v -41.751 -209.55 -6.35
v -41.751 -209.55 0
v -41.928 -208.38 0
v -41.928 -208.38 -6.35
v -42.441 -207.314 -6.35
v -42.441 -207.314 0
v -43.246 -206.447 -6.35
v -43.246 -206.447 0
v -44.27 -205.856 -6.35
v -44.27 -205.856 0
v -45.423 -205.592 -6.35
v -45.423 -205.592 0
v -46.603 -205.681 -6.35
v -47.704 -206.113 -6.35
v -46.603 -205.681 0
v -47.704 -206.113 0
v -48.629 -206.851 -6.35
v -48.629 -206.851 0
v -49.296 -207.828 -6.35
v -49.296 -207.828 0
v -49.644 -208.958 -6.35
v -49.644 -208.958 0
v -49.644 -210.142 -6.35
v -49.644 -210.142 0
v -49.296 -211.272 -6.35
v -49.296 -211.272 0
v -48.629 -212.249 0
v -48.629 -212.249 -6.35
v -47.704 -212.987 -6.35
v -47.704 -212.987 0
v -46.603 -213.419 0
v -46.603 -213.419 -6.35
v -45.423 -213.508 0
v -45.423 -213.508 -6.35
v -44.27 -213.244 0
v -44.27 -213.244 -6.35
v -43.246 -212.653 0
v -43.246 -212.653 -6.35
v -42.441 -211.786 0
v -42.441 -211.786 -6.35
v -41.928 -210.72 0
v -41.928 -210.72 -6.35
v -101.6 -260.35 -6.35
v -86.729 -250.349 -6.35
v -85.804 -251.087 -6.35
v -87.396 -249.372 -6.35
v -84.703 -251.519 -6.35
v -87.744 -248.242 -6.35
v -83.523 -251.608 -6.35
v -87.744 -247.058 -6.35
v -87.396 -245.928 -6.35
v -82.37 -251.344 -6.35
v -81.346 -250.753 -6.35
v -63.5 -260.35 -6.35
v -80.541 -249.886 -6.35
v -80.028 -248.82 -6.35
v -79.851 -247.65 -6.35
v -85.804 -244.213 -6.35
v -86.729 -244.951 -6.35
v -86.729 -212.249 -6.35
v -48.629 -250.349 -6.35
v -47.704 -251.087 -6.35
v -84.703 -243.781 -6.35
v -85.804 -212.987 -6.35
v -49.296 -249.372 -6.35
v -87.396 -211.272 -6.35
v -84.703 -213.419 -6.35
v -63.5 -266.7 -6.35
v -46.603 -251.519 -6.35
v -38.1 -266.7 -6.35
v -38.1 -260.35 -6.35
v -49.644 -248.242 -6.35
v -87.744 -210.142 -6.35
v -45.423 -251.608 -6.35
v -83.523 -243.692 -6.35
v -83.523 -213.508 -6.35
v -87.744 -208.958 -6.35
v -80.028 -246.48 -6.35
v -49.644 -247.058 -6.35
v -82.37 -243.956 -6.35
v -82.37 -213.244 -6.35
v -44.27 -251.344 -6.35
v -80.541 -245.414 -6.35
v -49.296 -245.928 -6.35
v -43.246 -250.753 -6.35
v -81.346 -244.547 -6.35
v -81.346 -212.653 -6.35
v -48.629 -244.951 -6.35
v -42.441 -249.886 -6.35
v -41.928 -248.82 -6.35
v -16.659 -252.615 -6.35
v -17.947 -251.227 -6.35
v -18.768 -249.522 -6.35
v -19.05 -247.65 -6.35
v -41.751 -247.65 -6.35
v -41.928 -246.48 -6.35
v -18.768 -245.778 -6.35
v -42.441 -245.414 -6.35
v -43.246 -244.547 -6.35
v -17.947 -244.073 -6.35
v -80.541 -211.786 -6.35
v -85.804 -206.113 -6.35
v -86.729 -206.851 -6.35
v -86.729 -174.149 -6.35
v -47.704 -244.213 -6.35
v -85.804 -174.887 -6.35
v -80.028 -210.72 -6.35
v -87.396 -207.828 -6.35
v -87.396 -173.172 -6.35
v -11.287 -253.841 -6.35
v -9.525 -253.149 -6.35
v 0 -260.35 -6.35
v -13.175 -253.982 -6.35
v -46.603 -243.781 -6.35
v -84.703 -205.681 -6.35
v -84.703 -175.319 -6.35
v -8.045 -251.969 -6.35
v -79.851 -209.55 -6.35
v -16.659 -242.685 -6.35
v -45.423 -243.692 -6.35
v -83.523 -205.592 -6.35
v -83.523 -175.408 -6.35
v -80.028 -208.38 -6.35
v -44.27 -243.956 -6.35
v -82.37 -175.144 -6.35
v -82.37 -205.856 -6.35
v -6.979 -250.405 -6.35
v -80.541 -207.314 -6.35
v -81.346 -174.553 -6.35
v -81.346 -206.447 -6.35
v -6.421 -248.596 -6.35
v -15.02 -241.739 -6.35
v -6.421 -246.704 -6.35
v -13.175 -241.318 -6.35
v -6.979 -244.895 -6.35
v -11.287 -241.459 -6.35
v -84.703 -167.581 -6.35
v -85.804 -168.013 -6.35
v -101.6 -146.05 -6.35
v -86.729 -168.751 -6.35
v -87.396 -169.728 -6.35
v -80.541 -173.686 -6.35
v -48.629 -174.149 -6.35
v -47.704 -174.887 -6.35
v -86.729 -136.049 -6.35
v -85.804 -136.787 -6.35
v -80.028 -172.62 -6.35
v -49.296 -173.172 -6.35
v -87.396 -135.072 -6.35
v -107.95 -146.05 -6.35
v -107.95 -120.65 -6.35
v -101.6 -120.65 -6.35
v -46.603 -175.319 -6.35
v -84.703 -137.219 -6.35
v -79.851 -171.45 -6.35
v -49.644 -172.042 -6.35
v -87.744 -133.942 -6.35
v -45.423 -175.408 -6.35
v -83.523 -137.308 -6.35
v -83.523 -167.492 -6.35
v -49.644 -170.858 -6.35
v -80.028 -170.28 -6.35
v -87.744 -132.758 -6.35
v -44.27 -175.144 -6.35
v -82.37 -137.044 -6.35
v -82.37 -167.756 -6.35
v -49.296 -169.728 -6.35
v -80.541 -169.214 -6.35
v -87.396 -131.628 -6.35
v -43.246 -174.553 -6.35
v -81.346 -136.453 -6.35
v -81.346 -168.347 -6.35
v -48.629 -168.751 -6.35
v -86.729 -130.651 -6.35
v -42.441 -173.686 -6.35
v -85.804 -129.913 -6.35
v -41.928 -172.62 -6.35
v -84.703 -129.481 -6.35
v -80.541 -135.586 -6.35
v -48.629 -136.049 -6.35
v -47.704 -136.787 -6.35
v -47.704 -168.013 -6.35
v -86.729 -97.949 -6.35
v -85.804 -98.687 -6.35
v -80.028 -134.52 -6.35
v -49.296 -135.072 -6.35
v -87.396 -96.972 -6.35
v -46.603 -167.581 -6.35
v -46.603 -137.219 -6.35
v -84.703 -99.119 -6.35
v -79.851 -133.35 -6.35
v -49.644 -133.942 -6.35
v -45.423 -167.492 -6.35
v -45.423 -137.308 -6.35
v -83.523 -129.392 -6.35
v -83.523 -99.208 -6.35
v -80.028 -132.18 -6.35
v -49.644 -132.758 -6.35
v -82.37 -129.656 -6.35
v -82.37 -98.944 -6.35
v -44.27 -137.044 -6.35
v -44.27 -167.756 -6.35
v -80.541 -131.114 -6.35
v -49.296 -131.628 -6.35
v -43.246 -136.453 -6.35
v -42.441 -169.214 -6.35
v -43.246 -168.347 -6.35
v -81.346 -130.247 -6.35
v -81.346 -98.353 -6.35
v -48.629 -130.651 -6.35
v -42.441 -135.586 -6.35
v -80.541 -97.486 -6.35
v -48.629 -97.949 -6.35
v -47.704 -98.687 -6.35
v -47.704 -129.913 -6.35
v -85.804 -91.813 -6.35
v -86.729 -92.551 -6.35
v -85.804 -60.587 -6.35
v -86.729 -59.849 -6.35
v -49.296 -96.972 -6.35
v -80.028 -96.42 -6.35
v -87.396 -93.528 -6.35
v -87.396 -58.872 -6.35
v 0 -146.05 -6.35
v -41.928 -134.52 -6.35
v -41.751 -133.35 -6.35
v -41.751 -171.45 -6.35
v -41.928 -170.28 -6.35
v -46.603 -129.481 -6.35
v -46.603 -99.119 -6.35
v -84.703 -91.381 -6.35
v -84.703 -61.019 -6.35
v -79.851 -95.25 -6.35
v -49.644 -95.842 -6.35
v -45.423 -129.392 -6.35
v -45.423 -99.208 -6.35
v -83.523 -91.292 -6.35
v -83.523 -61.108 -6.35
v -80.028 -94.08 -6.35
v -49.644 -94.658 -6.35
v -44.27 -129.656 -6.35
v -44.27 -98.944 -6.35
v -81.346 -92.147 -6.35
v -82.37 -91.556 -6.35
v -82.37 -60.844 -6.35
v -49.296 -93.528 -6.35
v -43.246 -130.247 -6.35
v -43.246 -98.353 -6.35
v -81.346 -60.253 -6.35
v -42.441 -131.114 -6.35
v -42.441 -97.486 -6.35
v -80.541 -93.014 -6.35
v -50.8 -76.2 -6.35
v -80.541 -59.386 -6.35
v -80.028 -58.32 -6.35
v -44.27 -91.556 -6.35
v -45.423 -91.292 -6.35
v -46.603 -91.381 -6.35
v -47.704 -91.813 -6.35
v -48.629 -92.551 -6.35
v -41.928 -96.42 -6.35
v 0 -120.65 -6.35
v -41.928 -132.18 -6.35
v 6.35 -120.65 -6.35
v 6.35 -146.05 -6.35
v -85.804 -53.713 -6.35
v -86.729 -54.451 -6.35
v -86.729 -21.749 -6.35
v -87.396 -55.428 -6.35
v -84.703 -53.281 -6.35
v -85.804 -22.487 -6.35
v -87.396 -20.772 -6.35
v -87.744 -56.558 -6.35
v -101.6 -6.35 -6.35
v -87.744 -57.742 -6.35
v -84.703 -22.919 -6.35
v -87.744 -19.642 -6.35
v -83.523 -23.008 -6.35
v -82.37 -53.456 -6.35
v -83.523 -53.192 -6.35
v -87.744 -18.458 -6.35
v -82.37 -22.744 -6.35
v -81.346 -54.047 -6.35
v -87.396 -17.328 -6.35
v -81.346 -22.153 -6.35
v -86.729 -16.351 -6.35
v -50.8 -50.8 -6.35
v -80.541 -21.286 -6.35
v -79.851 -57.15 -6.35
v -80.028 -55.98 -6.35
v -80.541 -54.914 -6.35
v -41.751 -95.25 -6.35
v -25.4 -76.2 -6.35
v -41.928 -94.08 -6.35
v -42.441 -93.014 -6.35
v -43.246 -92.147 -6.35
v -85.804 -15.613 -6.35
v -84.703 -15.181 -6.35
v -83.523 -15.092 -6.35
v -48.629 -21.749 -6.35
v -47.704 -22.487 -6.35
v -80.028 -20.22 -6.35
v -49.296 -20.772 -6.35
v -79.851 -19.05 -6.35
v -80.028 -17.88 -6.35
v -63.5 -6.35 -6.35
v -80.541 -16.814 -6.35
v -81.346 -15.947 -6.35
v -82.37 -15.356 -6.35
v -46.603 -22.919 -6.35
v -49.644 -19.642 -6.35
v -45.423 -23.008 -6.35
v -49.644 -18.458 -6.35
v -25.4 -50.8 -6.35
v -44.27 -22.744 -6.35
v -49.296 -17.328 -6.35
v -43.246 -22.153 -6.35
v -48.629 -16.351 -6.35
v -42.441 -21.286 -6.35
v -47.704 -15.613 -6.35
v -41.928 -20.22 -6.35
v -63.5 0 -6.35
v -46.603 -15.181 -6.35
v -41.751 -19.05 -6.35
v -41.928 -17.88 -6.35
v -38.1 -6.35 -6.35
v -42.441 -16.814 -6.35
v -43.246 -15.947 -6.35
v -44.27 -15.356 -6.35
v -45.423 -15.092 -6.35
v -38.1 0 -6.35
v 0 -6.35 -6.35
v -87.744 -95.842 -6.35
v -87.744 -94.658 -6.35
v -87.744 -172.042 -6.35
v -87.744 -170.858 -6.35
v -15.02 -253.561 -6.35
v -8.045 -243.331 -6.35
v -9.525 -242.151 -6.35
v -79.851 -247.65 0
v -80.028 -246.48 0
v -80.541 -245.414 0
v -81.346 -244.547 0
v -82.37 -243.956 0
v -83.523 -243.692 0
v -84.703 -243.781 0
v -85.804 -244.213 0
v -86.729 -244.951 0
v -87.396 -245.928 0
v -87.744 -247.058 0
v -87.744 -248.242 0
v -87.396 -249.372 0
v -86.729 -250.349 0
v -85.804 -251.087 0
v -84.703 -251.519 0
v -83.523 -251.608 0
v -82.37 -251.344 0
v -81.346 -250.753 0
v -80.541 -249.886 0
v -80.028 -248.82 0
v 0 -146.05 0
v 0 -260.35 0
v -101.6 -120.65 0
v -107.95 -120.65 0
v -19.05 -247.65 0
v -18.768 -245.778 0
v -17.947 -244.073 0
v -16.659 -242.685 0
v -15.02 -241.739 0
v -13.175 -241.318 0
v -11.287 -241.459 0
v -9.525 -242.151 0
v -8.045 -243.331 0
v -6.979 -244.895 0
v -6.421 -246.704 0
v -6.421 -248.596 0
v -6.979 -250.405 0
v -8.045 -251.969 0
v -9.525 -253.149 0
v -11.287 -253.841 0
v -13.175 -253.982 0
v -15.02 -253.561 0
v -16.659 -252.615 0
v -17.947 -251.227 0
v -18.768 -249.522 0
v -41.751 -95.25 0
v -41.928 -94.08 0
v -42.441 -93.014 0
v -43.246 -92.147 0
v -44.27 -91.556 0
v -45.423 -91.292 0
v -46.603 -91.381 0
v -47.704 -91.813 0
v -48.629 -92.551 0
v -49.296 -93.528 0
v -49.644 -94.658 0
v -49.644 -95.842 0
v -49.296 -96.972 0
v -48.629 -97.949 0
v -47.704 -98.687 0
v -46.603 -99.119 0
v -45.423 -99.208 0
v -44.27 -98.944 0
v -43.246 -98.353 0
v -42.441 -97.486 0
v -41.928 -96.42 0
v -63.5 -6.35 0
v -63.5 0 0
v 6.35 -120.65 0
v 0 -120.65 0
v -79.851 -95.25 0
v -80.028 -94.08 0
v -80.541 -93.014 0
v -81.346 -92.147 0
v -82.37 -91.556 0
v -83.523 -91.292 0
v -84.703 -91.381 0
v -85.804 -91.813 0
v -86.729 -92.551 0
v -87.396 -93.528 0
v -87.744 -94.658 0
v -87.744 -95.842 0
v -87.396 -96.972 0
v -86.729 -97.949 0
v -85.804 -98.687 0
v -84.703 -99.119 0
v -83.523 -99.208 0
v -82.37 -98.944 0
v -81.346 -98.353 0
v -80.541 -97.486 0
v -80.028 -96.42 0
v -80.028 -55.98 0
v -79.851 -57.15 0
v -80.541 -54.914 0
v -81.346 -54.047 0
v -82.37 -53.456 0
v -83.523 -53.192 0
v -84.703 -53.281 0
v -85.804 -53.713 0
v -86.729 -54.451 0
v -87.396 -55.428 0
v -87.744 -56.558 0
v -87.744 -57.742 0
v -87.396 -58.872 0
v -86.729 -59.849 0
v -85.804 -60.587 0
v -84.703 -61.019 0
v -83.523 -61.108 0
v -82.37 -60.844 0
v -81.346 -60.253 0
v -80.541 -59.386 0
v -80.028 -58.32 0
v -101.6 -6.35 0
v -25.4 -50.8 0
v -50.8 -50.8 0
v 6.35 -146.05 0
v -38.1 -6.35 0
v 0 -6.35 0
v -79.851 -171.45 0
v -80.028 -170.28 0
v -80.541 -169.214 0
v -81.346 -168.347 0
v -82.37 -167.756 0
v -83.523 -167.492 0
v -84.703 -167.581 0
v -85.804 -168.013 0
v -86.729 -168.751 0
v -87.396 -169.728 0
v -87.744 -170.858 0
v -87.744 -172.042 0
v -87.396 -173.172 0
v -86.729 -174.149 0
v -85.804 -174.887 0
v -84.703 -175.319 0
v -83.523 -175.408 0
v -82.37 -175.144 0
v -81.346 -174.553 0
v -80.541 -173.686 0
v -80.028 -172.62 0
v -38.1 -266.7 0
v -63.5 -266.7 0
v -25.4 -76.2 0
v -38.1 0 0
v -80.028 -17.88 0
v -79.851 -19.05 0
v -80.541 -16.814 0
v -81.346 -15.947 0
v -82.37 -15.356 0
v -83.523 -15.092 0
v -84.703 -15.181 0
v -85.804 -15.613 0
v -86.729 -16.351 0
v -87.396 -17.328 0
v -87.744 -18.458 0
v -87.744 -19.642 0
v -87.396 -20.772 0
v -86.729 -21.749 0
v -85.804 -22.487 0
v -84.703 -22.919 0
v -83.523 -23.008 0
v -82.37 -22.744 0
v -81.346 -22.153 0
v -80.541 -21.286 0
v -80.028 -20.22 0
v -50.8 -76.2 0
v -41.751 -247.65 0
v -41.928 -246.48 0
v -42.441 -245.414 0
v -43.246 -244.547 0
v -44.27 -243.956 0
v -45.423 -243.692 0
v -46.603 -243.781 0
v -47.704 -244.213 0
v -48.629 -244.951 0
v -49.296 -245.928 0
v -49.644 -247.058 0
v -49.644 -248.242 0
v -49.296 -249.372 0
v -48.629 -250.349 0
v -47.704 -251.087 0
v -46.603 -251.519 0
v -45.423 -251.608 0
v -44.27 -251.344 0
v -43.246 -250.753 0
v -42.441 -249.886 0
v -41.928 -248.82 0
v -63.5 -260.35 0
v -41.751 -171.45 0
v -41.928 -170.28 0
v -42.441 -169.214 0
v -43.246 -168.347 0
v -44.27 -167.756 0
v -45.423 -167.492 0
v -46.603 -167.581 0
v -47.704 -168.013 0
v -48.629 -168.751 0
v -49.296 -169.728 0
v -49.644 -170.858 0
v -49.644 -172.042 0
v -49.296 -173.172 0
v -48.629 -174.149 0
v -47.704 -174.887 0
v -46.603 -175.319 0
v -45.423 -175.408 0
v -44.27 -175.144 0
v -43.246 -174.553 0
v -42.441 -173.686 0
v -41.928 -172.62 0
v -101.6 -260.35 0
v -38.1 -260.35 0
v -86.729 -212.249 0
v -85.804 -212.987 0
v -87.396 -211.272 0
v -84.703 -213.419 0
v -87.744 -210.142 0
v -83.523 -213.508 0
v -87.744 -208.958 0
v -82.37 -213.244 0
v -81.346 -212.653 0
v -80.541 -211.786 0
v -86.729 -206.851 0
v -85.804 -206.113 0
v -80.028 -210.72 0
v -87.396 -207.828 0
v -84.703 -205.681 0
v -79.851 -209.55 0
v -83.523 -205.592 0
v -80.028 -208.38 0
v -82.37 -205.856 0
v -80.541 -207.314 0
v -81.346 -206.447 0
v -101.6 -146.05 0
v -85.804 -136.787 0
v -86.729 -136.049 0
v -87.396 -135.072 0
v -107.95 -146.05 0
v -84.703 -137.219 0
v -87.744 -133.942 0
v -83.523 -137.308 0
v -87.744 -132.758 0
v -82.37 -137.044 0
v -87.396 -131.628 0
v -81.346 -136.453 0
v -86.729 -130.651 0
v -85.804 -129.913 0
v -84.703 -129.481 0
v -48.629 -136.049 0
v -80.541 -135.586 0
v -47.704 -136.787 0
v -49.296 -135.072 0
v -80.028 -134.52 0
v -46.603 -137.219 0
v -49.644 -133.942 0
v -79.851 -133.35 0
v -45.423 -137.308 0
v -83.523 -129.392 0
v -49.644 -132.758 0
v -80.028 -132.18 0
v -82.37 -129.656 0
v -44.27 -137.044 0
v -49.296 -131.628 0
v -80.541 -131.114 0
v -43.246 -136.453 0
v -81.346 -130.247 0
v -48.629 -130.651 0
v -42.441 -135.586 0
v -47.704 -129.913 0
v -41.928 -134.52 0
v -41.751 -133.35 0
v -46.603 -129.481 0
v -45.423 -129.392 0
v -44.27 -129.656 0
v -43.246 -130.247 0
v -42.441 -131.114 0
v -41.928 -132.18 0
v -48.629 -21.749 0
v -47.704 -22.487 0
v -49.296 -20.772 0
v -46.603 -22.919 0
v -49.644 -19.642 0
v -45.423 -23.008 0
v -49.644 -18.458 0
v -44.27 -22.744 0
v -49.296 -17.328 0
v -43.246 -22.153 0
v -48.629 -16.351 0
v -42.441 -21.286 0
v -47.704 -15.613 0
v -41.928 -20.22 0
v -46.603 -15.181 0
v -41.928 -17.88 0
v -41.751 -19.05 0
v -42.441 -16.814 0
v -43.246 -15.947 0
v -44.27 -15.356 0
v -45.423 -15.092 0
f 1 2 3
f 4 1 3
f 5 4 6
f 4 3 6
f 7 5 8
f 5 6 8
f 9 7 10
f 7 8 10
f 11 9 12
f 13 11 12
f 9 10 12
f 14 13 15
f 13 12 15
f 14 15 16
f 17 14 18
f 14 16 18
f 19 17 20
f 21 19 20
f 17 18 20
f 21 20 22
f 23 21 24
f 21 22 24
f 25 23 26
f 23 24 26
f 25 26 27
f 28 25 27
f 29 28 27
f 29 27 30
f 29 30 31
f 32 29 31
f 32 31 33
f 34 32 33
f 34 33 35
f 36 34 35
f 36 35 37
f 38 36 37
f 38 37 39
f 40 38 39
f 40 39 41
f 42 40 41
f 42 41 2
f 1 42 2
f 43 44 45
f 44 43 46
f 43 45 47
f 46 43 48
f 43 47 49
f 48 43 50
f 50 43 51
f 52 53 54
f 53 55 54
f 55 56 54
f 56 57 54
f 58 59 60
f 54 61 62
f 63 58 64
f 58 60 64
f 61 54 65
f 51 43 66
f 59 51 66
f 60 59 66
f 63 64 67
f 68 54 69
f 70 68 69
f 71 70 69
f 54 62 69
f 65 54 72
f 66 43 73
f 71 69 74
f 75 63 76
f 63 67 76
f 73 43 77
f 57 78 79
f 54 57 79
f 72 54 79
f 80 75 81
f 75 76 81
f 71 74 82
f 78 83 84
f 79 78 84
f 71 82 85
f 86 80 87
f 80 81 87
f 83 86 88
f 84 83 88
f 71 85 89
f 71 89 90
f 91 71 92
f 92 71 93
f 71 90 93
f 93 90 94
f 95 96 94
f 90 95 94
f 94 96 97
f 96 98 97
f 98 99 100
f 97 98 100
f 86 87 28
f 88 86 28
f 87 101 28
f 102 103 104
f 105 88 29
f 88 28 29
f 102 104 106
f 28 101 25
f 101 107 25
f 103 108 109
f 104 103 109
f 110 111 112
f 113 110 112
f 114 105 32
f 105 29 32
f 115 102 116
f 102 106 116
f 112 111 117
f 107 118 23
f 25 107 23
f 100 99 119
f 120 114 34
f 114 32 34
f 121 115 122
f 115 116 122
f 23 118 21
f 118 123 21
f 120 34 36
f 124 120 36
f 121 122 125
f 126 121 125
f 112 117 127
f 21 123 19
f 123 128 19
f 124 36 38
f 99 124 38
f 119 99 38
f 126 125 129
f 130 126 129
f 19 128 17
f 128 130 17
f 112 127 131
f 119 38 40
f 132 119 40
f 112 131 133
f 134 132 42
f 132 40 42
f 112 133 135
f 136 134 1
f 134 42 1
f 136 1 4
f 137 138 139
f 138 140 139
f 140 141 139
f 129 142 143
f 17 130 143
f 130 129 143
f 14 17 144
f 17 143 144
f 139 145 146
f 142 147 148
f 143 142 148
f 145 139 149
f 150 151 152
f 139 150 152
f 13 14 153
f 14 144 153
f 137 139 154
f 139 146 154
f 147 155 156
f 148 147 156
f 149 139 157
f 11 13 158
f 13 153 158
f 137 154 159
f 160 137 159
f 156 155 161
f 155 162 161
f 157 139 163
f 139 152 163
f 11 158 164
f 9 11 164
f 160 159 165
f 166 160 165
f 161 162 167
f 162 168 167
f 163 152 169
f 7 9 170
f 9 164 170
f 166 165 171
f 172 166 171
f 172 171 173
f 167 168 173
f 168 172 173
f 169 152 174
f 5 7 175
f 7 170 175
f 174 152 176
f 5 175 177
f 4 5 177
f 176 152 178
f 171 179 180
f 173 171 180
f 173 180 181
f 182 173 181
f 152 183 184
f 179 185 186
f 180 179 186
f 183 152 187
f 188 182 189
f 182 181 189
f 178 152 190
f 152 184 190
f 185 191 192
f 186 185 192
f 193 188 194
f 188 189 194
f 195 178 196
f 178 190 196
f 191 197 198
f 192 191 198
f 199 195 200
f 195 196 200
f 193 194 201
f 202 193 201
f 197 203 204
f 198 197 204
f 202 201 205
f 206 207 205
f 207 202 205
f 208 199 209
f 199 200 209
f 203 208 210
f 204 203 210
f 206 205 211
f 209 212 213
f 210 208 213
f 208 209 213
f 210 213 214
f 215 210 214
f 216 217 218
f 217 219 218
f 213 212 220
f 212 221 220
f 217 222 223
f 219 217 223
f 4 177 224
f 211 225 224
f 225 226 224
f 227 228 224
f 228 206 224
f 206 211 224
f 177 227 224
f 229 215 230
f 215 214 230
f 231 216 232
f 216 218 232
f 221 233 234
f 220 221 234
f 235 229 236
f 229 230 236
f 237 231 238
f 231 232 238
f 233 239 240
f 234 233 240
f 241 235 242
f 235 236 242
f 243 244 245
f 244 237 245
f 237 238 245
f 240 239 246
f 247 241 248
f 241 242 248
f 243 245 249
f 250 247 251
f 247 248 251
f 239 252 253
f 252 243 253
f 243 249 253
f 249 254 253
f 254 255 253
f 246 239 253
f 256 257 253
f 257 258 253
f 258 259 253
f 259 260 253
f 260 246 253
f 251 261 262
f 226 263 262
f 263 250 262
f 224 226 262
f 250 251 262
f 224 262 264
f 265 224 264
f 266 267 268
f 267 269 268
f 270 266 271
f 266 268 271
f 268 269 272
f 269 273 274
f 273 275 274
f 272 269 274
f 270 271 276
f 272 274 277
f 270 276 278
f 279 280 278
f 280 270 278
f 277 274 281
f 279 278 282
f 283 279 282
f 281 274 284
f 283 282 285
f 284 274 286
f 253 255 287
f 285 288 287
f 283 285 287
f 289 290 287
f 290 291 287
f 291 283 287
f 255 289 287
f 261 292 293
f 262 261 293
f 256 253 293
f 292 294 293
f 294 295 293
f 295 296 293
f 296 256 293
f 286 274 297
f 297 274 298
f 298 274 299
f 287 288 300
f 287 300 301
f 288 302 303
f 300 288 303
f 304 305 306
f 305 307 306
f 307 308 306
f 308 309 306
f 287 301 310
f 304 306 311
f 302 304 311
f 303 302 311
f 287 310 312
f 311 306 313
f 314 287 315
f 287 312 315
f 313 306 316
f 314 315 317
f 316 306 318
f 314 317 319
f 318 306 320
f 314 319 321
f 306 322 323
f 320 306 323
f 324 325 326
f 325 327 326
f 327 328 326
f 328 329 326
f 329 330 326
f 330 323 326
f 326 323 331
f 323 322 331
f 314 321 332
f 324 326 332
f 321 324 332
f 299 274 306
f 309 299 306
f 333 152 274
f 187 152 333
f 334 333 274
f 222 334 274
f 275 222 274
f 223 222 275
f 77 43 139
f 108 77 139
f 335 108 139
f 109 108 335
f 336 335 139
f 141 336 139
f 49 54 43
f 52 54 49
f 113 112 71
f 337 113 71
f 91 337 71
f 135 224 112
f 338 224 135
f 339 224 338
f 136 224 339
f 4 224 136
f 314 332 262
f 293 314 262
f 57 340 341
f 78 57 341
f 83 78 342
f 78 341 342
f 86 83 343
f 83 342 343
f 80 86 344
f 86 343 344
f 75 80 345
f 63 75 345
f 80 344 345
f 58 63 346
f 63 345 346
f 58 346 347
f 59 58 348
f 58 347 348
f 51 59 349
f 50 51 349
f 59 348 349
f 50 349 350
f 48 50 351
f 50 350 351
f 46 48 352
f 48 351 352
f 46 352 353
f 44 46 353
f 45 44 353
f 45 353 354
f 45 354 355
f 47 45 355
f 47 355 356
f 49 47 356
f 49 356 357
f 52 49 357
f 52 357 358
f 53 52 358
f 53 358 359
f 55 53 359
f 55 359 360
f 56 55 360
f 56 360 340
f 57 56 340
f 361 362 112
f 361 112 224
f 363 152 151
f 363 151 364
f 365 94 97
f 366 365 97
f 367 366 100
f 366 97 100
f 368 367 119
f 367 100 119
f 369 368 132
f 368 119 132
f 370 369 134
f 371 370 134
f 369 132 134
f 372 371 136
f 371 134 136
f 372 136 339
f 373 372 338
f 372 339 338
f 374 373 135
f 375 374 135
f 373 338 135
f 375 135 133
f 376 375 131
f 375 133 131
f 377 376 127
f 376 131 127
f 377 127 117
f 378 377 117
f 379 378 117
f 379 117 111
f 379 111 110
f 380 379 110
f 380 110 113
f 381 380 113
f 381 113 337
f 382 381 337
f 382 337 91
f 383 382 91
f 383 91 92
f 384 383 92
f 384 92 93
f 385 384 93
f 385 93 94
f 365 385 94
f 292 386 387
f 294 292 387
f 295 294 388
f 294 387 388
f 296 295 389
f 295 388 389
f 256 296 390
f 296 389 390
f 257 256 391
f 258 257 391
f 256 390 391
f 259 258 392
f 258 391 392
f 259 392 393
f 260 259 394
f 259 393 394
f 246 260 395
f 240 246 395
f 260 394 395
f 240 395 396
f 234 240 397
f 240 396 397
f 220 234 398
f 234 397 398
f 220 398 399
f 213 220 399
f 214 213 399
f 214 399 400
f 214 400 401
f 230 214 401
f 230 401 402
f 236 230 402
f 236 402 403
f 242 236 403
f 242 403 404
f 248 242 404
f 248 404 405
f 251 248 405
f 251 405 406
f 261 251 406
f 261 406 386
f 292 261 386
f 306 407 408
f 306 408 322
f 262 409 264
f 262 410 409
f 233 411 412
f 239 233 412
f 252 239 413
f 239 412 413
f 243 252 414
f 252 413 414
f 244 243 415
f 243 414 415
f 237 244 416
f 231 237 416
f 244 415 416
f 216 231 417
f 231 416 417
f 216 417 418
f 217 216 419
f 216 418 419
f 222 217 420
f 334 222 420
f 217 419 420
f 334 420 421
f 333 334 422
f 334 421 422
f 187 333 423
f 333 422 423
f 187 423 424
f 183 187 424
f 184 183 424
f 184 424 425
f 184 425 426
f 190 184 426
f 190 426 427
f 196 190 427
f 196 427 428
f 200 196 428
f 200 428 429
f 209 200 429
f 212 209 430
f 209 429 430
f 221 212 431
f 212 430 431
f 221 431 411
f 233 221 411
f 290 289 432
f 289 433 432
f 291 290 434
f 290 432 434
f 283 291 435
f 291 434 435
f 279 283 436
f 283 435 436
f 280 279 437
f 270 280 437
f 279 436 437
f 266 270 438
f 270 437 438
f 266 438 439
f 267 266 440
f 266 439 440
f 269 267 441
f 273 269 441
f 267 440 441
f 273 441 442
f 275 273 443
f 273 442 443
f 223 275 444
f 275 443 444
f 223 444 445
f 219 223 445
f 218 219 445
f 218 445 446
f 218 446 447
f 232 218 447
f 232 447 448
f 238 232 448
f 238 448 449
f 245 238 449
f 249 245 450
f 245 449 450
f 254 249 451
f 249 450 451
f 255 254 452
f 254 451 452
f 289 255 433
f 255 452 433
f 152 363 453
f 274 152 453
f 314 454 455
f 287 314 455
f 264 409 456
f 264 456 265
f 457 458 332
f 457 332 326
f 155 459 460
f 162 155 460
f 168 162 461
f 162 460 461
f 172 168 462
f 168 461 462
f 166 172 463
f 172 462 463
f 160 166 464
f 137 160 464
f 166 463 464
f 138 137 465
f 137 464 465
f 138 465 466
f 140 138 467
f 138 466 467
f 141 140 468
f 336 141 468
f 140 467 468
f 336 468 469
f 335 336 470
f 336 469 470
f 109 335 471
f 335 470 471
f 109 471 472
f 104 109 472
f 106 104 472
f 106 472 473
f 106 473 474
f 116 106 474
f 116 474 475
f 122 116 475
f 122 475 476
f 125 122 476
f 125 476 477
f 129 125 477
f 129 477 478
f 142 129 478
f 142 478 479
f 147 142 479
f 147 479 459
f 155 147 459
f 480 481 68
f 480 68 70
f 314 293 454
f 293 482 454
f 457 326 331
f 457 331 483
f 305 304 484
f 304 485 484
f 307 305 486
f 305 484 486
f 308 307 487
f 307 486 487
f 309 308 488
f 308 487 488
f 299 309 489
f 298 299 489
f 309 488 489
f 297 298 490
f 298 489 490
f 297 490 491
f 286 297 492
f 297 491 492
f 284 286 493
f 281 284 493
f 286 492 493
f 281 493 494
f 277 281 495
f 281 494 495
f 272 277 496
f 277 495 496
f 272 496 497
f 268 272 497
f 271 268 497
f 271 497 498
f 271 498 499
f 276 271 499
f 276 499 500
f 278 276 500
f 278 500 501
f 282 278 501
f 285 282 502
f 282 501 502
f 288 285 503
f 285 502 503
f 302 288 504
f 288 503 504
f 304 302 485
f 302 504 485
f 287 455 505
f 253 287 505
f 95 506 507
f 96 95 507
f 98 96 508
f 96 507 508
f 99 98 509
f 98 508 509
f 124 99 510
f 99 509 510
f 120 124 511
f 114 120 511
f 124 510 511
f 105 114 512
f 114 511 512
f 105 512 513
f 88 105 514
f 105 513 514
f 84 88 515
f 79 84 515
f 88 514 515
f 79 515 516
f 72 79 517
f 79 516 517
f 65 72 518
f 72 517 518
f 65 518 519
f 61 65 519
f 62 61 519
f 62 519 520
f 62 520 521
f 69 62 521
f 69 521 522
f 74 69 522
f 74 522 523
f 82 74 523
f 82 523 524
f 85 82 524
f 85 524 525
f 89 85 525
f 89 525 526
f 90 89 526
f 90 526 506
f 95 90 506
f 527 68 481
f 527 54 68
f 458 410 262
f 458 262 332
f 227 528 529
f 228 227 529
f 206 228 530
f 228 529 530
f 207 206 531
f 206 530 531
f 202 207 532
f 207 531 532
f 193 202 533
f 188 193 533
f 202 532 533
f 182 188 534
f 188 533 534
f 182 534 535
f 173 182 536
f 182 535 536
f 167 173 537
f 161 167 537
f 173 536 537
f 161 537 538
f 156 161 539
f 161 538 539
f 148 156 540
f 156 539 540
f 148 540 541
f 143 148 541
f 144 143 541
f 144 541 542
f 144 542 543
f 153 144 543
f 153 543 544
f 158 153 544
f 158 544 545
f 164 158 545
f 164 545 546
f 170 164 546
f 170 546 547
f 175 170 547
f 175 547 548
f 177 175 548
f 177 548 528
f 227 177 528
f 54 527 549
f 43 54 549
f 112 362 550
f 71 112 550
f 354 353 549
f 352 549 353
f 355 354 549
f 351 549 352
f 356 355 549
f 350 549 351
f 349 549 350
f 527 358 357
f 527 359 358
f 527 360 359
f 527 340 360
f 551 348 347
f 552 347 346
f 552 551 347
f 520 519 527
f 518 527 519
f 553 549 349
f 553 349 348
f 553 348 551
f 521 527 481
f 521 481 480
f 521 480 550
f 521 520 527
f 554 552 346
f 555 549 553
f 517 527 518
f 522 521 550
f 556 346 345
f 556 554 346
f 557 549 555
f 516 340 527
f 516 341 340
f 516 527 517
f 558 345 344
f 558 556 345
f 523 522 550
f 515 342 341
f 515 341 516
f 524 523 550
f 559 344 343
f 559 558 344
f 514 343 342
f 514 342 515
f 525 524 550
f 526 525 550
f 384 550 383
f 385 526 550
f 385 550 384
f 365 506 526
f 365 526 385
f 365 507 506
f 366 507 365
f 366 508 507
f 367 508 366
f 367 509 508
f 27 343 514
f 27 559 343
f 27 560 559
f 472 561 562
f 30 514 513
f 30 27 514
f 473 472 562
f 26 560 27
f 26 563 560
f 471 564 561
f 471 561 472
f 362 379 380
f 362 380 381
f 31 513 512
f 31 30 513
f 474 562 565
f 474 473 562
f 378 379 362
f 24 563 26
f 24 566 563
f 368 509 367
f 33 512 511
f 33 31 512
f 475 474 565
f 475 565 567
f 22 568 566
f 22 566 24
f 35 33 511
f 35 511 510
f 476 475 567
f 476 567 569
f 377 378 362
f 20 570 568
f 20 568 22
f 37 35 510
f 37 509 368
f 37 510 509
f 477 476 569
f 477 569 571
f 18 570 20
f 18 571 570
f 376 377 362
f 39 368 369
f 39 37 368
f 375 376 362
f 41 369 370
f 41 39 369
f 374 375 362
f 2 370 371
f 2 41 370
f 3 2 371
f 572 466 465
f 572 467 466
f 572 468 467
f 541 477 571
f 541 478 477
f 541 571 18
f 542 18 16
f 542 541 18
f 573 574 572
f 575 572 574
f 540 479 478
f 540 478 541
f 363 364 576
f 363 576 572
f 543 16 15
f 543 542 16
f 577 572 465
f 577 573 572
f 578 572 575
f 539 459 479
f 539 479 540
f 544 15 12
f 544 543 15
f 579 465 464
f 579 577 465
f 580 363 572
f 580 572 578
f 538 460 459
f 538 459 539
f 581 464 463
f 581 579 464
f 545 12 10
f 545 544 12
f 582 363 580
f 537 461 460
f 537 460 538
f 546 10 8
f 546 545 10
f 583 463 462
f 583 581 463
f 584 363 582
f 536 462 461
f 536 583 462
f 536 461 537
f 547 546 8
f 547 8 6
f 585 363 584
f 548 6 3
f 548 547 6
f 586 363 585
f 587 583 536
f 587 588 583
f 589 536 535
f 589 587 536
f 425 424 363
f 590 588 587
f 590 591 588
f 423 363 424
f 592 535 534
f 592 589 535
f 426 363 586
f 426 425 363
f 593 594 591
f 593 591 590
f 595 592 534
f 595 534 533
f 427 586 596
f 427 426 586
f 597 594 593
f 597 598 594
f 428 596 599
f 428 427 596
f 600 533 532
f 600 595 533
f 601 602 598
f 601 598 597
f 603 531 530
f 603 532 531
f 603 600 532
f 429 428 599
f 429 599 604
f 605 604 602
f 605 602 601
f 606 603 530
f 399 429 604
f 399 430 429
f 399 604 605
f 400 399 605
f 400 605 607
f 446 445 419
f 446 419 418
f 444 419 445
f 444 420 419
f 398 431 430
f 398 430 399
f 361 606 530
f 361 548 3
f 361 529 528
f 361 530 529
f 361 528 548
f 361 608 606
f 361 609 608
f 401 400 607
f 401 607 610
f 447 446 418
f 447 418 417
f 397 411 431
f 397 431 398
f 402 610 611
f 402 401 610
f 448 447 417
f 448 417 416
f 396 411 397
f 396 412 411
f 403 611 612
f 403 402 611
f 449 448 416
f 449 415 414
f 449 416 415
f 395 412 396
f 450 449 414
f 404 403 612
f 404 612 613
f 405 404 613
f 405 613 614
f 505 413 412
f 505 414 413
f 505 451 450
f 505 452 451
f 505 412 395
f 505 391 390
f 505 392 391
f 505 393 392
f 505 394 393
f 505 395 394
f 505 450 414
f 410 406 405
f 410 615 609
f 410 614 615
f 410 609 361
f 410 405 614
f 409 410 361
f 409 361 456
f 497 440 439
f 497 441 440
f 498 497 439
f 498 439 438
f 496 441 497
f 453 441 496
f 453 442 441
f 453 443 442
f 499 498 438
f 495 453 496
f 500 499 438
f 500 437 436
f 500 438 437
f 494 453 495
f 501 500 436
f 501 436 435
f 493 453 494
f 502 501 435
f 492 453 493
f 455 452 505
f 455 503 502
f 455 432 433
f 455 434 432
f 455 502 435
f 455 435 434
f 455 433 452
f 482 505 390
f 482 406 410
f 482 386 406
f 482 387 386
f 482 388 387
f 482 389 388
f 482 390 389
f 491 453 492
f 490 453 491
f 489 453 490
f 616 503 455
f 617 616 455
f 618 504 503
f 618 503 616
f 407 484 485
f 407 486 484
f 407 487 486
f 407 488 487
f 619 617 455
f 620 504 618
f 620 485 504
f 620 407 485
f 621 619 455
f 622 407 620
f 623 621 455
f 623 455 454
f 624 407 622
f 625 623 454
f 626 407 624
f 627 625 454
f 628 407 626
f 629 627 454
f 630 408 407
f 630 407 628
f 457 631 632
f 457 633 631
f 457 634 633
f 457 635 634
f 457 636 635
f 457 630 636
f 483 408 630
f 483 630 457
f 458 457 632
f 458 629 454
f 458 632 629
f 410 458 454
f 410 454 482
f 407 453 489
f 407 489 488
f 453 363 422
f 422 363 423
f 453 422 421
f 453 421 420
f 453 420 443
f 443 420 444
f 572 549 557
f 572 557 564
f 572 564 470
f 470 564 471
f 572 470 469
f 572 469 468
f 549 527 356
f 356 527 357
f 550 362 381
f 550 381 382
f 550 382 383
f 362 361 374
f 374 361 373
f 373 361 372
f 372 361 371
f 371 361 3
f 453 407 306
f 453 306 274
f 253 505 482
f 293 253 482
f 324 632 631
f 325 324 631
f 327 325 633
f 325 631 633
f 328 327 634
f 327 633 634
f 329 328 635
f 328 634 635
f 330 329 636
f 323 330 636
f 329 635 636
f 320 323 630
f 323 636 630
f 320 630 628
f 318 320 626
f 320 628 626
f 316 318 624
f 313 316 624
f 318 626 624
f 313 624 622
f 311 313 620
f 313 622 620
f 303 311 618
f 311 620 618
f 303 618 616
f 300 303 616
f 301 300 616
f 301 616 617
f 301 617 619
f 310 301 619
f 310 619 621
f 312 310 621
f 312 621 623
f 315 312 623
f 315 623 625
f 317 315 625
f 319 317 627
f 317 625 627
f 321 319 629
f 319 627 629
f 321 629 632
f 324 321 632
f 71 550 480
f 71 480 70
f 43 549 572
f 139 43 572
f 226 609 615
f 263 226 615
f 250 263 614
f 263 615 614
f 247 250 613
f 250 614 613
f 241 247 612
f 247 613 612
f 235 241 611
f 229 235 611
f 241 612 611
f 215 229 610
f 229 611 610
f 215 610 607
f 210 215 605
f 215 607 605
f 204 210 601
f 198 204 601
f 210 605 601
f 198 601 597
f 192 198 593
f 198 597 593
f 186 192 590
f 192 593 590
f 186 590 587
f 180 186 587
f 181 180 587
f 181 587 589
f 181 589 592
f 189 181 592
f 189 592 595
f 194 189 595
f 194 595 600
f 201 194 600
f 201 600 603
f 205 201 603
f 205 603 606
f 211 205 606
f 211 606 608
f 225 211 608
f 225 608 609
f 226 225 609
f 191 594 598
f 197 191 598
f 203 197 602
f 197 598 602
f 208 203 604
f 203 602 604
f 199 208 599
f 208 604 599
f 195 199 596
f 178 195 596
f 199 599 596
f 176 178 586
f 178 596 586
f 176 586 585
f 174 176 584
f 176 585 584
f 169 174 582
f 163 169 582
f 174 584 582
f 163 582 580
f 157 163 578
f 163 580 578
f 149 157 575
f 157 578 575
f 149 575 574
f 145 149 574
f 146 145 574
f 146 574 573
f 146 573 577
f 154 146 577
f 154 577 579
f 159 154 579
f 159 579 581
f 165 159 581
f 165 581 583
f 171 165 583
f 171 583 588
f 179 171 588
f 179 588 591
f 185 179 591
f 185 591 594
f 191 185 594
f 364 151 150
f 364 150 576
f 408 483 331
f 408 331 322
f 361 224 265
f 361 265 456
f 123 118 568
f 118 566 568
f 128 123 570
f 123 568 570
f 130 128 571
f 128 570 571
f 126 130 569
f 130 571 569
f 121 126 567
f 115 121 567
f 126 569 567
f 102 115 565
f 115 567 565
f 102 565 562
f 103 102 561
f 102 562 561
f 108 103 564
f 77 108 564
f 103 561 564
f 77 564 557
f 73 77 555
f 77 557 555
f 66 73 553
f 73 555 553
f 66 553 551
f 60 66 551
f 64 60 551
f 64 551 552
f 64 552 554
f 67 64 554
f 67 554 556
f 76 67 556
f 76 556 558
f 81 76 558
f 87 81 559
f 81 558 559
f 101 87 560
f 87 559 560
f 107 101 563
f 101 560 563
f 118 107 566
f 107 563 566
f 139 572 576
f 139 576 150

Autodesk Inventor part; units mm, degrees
ref_plane "YZ Plane" through (0, 0, 0) normal (1, 0, 0) x (0, 1, 0)
ref_plane "XZ Plane" through (0, 0, 0) normal (0, 1, 0) x (-1, 0, 0)
ref_plane "XY Plane" through (0, 0, 0) normal (0, 0, 1) x (1, 0, 0)
sketch "Sketch1" plane through (0, 0, 0) normal (0, 0, 1) x (1, 0, 0)
  line L0 (-101.6, -273.05) -> (-101.6, 6.35) projected
  line L1 (0, -273.05) -> (0, 6.35) projected
  line L2 (0, -6.35) -> (-101.6, -6.35) projected
  line L3 (0, -260.35) -> (-101.6, -260.35) projected
  point P0 (0, 0)
extrude "Extrusion1" add sketch "Sketch1" against normal blind 6.35
sketch "Sketch2" plane through (-101.6, -260.35, 0) normal (0, -1, 0) x (1, 0, 0)
  line L0 (0, 0) -> (0, -6.35) projected
  line L1 (101.6, 0) -> (101.6, -6.35) projected
  line L2 (38.1, 0) -> (63.5, 0)
  line L3 (63.5, 0) -> (63.5, -6.35)
  line L4 (63.5, -6.35) -> (38.1, -6.35)
  line L5 (38.1, -6.35) -> (38.1, 0)
  dimension "d2" = 25.4
  dimension "d3" = 38.1
  dimension "d4" = 38.1
extrude "Extrusion2" add sketch "Sketch2" along normal blind 6.35
ref_plane "Work Plane1" through (-101.6, -133.35, -6.35) normal (0, -1, 0) x (1, 0, 0)
mirror "Mirror1" about plane through (-101.6, -133.35, -6.35) normal (0, -1, 0) of "Extrusion2"
sketch "Sketch3" plane through (0, -260.35, 0) normal (1, 0, 0) x (0, 0, -1)
  line L0 (0, 0) -> (6.35, 0) projected
  line L1 (0, 254) -> (6.35, 254) projected
  line L2 (0, 139.7) -> (6.35, 139.7)
  line L3 (6.35, 139.7) -> (6.35, 114.3)
  line L4 (6.35, 114.3) -> (0, 114.3)
  line L5 (0, 114.3) -> (0, 139.7)
  point P0 (0, 260.35)
  dimension "d7" = 25.4
  dimension "d8" = 6.35
  dimension "d9" = 114.3
  dimension "d10" = 114.3
extrude "Extrusion3" add sketch "Sketch3" along normal blind 6.35
ref_plane "Work Plane2" through (-50.8, -260.35, 0) normal (1, 0, 0) x (0, 0, -1)
mirror "Mirror2" about plane through (-50.8, -260.35, 0) normal (1, 0, 0) of "Extrusion3"
sketch "Sketch4" plane through (0, 0, 0) normal (0, 0, 1) x (1, 0, 0)
  line L0 (0, -6.35) -> (0, -120.65) projected
  line L1 (-38.1, -6.35) -> (0, -6.35) projected
  line L2 (-25.4, -50.8) -> (-50.8, -50.8)
  line L3 (-50.8, -50.8) -> (-50.8, -76.2)
  line L4 (-50.8, -76.2) -> (-25.4, -76.2)
  line L5 (-25.4, -76.2) -> (-25.4, -50.8)
  point P0 (0, 0)
  dimension "d13" = 25.4
  dimension "d14" = 25.4
  dimension "d15" = 25.4
  dimension "d16" = 44.45
extrude "Extrusion4" cut sketch "Sketch4" against normal through all
sketch "Sketch5" plane through (0, 0, 0) normal (0, 0, 1) x (1, 0, 0)
  line L0 (-101.6, -6.35) -> (-63.5, -6.35) projected
  line L1 (-101.6, -120.65) -> (-101.6, -6.35) projected
  line L2 (0, -260.35) -> (-38.1, -260.35) projected
  circle A0 centre (-83.82, -19.05) radius 3.9687
  circle A1 centre (-83.82, -57.15) radius 3.9687
  circle A2 centre (-83.82, -95.25) radius 3.9687
  circle A3 centre (-83.82, -133.35) radius 3.9687
  circle A4 centre (-83.82, -171.45) radius 3.9687
  circle A5 centre (-83.82, -209.55) radius 3.9687
  circle A6 centre (-83.82, -247.65) radius 3.9687
  circle A7 centre (-45.72, -19.05) radius 3.9687
  circle A8 centre (-45.72, -95.25) radius 3.9687
  circle A9 centre (-45.72, -133.35) radius 3.9687
  circle A10 centre (-45.72, -171.45) radius 3.9687
  circle A11 centre (-45.72, -209.55) radius 3.9687
  circle A12 centre (-45.72, -247.65) radius 3.9687
  point P0 (0, 0)
  dimension "d19" = 7.9375
  dimension "d20" = 17.78
  dimension "d21" = 12.7
  dimension "d24" = 38.1
  dimension "d31" = 38.1
extrude "Extrusion5" cut sketch "Sketch5" against normal through all
sketch "Sketch6" plane through (0, 0, -6.35) normal (0, 0, -1) x (-1, 0, 0)
  line L0 (0, -146.05) -> (0, -260.35) projected
  line L1 (0, -260.35) -> (38.1, -260.35) projected
  circle A0 centre (12.7, -247.65) radius 6.35
  point P0 (0, 0)
  dimension "d38" = 12.7
  dimension "d39" = 12.7
  dimension "d40" = 12.7
extrude "Extrusion6" cut sketch "Sketch6" against normal through all
equation "\"d3\" = d4"
equation "\"d9\" = d10"
properties part number "baseBoxLongSide01"
